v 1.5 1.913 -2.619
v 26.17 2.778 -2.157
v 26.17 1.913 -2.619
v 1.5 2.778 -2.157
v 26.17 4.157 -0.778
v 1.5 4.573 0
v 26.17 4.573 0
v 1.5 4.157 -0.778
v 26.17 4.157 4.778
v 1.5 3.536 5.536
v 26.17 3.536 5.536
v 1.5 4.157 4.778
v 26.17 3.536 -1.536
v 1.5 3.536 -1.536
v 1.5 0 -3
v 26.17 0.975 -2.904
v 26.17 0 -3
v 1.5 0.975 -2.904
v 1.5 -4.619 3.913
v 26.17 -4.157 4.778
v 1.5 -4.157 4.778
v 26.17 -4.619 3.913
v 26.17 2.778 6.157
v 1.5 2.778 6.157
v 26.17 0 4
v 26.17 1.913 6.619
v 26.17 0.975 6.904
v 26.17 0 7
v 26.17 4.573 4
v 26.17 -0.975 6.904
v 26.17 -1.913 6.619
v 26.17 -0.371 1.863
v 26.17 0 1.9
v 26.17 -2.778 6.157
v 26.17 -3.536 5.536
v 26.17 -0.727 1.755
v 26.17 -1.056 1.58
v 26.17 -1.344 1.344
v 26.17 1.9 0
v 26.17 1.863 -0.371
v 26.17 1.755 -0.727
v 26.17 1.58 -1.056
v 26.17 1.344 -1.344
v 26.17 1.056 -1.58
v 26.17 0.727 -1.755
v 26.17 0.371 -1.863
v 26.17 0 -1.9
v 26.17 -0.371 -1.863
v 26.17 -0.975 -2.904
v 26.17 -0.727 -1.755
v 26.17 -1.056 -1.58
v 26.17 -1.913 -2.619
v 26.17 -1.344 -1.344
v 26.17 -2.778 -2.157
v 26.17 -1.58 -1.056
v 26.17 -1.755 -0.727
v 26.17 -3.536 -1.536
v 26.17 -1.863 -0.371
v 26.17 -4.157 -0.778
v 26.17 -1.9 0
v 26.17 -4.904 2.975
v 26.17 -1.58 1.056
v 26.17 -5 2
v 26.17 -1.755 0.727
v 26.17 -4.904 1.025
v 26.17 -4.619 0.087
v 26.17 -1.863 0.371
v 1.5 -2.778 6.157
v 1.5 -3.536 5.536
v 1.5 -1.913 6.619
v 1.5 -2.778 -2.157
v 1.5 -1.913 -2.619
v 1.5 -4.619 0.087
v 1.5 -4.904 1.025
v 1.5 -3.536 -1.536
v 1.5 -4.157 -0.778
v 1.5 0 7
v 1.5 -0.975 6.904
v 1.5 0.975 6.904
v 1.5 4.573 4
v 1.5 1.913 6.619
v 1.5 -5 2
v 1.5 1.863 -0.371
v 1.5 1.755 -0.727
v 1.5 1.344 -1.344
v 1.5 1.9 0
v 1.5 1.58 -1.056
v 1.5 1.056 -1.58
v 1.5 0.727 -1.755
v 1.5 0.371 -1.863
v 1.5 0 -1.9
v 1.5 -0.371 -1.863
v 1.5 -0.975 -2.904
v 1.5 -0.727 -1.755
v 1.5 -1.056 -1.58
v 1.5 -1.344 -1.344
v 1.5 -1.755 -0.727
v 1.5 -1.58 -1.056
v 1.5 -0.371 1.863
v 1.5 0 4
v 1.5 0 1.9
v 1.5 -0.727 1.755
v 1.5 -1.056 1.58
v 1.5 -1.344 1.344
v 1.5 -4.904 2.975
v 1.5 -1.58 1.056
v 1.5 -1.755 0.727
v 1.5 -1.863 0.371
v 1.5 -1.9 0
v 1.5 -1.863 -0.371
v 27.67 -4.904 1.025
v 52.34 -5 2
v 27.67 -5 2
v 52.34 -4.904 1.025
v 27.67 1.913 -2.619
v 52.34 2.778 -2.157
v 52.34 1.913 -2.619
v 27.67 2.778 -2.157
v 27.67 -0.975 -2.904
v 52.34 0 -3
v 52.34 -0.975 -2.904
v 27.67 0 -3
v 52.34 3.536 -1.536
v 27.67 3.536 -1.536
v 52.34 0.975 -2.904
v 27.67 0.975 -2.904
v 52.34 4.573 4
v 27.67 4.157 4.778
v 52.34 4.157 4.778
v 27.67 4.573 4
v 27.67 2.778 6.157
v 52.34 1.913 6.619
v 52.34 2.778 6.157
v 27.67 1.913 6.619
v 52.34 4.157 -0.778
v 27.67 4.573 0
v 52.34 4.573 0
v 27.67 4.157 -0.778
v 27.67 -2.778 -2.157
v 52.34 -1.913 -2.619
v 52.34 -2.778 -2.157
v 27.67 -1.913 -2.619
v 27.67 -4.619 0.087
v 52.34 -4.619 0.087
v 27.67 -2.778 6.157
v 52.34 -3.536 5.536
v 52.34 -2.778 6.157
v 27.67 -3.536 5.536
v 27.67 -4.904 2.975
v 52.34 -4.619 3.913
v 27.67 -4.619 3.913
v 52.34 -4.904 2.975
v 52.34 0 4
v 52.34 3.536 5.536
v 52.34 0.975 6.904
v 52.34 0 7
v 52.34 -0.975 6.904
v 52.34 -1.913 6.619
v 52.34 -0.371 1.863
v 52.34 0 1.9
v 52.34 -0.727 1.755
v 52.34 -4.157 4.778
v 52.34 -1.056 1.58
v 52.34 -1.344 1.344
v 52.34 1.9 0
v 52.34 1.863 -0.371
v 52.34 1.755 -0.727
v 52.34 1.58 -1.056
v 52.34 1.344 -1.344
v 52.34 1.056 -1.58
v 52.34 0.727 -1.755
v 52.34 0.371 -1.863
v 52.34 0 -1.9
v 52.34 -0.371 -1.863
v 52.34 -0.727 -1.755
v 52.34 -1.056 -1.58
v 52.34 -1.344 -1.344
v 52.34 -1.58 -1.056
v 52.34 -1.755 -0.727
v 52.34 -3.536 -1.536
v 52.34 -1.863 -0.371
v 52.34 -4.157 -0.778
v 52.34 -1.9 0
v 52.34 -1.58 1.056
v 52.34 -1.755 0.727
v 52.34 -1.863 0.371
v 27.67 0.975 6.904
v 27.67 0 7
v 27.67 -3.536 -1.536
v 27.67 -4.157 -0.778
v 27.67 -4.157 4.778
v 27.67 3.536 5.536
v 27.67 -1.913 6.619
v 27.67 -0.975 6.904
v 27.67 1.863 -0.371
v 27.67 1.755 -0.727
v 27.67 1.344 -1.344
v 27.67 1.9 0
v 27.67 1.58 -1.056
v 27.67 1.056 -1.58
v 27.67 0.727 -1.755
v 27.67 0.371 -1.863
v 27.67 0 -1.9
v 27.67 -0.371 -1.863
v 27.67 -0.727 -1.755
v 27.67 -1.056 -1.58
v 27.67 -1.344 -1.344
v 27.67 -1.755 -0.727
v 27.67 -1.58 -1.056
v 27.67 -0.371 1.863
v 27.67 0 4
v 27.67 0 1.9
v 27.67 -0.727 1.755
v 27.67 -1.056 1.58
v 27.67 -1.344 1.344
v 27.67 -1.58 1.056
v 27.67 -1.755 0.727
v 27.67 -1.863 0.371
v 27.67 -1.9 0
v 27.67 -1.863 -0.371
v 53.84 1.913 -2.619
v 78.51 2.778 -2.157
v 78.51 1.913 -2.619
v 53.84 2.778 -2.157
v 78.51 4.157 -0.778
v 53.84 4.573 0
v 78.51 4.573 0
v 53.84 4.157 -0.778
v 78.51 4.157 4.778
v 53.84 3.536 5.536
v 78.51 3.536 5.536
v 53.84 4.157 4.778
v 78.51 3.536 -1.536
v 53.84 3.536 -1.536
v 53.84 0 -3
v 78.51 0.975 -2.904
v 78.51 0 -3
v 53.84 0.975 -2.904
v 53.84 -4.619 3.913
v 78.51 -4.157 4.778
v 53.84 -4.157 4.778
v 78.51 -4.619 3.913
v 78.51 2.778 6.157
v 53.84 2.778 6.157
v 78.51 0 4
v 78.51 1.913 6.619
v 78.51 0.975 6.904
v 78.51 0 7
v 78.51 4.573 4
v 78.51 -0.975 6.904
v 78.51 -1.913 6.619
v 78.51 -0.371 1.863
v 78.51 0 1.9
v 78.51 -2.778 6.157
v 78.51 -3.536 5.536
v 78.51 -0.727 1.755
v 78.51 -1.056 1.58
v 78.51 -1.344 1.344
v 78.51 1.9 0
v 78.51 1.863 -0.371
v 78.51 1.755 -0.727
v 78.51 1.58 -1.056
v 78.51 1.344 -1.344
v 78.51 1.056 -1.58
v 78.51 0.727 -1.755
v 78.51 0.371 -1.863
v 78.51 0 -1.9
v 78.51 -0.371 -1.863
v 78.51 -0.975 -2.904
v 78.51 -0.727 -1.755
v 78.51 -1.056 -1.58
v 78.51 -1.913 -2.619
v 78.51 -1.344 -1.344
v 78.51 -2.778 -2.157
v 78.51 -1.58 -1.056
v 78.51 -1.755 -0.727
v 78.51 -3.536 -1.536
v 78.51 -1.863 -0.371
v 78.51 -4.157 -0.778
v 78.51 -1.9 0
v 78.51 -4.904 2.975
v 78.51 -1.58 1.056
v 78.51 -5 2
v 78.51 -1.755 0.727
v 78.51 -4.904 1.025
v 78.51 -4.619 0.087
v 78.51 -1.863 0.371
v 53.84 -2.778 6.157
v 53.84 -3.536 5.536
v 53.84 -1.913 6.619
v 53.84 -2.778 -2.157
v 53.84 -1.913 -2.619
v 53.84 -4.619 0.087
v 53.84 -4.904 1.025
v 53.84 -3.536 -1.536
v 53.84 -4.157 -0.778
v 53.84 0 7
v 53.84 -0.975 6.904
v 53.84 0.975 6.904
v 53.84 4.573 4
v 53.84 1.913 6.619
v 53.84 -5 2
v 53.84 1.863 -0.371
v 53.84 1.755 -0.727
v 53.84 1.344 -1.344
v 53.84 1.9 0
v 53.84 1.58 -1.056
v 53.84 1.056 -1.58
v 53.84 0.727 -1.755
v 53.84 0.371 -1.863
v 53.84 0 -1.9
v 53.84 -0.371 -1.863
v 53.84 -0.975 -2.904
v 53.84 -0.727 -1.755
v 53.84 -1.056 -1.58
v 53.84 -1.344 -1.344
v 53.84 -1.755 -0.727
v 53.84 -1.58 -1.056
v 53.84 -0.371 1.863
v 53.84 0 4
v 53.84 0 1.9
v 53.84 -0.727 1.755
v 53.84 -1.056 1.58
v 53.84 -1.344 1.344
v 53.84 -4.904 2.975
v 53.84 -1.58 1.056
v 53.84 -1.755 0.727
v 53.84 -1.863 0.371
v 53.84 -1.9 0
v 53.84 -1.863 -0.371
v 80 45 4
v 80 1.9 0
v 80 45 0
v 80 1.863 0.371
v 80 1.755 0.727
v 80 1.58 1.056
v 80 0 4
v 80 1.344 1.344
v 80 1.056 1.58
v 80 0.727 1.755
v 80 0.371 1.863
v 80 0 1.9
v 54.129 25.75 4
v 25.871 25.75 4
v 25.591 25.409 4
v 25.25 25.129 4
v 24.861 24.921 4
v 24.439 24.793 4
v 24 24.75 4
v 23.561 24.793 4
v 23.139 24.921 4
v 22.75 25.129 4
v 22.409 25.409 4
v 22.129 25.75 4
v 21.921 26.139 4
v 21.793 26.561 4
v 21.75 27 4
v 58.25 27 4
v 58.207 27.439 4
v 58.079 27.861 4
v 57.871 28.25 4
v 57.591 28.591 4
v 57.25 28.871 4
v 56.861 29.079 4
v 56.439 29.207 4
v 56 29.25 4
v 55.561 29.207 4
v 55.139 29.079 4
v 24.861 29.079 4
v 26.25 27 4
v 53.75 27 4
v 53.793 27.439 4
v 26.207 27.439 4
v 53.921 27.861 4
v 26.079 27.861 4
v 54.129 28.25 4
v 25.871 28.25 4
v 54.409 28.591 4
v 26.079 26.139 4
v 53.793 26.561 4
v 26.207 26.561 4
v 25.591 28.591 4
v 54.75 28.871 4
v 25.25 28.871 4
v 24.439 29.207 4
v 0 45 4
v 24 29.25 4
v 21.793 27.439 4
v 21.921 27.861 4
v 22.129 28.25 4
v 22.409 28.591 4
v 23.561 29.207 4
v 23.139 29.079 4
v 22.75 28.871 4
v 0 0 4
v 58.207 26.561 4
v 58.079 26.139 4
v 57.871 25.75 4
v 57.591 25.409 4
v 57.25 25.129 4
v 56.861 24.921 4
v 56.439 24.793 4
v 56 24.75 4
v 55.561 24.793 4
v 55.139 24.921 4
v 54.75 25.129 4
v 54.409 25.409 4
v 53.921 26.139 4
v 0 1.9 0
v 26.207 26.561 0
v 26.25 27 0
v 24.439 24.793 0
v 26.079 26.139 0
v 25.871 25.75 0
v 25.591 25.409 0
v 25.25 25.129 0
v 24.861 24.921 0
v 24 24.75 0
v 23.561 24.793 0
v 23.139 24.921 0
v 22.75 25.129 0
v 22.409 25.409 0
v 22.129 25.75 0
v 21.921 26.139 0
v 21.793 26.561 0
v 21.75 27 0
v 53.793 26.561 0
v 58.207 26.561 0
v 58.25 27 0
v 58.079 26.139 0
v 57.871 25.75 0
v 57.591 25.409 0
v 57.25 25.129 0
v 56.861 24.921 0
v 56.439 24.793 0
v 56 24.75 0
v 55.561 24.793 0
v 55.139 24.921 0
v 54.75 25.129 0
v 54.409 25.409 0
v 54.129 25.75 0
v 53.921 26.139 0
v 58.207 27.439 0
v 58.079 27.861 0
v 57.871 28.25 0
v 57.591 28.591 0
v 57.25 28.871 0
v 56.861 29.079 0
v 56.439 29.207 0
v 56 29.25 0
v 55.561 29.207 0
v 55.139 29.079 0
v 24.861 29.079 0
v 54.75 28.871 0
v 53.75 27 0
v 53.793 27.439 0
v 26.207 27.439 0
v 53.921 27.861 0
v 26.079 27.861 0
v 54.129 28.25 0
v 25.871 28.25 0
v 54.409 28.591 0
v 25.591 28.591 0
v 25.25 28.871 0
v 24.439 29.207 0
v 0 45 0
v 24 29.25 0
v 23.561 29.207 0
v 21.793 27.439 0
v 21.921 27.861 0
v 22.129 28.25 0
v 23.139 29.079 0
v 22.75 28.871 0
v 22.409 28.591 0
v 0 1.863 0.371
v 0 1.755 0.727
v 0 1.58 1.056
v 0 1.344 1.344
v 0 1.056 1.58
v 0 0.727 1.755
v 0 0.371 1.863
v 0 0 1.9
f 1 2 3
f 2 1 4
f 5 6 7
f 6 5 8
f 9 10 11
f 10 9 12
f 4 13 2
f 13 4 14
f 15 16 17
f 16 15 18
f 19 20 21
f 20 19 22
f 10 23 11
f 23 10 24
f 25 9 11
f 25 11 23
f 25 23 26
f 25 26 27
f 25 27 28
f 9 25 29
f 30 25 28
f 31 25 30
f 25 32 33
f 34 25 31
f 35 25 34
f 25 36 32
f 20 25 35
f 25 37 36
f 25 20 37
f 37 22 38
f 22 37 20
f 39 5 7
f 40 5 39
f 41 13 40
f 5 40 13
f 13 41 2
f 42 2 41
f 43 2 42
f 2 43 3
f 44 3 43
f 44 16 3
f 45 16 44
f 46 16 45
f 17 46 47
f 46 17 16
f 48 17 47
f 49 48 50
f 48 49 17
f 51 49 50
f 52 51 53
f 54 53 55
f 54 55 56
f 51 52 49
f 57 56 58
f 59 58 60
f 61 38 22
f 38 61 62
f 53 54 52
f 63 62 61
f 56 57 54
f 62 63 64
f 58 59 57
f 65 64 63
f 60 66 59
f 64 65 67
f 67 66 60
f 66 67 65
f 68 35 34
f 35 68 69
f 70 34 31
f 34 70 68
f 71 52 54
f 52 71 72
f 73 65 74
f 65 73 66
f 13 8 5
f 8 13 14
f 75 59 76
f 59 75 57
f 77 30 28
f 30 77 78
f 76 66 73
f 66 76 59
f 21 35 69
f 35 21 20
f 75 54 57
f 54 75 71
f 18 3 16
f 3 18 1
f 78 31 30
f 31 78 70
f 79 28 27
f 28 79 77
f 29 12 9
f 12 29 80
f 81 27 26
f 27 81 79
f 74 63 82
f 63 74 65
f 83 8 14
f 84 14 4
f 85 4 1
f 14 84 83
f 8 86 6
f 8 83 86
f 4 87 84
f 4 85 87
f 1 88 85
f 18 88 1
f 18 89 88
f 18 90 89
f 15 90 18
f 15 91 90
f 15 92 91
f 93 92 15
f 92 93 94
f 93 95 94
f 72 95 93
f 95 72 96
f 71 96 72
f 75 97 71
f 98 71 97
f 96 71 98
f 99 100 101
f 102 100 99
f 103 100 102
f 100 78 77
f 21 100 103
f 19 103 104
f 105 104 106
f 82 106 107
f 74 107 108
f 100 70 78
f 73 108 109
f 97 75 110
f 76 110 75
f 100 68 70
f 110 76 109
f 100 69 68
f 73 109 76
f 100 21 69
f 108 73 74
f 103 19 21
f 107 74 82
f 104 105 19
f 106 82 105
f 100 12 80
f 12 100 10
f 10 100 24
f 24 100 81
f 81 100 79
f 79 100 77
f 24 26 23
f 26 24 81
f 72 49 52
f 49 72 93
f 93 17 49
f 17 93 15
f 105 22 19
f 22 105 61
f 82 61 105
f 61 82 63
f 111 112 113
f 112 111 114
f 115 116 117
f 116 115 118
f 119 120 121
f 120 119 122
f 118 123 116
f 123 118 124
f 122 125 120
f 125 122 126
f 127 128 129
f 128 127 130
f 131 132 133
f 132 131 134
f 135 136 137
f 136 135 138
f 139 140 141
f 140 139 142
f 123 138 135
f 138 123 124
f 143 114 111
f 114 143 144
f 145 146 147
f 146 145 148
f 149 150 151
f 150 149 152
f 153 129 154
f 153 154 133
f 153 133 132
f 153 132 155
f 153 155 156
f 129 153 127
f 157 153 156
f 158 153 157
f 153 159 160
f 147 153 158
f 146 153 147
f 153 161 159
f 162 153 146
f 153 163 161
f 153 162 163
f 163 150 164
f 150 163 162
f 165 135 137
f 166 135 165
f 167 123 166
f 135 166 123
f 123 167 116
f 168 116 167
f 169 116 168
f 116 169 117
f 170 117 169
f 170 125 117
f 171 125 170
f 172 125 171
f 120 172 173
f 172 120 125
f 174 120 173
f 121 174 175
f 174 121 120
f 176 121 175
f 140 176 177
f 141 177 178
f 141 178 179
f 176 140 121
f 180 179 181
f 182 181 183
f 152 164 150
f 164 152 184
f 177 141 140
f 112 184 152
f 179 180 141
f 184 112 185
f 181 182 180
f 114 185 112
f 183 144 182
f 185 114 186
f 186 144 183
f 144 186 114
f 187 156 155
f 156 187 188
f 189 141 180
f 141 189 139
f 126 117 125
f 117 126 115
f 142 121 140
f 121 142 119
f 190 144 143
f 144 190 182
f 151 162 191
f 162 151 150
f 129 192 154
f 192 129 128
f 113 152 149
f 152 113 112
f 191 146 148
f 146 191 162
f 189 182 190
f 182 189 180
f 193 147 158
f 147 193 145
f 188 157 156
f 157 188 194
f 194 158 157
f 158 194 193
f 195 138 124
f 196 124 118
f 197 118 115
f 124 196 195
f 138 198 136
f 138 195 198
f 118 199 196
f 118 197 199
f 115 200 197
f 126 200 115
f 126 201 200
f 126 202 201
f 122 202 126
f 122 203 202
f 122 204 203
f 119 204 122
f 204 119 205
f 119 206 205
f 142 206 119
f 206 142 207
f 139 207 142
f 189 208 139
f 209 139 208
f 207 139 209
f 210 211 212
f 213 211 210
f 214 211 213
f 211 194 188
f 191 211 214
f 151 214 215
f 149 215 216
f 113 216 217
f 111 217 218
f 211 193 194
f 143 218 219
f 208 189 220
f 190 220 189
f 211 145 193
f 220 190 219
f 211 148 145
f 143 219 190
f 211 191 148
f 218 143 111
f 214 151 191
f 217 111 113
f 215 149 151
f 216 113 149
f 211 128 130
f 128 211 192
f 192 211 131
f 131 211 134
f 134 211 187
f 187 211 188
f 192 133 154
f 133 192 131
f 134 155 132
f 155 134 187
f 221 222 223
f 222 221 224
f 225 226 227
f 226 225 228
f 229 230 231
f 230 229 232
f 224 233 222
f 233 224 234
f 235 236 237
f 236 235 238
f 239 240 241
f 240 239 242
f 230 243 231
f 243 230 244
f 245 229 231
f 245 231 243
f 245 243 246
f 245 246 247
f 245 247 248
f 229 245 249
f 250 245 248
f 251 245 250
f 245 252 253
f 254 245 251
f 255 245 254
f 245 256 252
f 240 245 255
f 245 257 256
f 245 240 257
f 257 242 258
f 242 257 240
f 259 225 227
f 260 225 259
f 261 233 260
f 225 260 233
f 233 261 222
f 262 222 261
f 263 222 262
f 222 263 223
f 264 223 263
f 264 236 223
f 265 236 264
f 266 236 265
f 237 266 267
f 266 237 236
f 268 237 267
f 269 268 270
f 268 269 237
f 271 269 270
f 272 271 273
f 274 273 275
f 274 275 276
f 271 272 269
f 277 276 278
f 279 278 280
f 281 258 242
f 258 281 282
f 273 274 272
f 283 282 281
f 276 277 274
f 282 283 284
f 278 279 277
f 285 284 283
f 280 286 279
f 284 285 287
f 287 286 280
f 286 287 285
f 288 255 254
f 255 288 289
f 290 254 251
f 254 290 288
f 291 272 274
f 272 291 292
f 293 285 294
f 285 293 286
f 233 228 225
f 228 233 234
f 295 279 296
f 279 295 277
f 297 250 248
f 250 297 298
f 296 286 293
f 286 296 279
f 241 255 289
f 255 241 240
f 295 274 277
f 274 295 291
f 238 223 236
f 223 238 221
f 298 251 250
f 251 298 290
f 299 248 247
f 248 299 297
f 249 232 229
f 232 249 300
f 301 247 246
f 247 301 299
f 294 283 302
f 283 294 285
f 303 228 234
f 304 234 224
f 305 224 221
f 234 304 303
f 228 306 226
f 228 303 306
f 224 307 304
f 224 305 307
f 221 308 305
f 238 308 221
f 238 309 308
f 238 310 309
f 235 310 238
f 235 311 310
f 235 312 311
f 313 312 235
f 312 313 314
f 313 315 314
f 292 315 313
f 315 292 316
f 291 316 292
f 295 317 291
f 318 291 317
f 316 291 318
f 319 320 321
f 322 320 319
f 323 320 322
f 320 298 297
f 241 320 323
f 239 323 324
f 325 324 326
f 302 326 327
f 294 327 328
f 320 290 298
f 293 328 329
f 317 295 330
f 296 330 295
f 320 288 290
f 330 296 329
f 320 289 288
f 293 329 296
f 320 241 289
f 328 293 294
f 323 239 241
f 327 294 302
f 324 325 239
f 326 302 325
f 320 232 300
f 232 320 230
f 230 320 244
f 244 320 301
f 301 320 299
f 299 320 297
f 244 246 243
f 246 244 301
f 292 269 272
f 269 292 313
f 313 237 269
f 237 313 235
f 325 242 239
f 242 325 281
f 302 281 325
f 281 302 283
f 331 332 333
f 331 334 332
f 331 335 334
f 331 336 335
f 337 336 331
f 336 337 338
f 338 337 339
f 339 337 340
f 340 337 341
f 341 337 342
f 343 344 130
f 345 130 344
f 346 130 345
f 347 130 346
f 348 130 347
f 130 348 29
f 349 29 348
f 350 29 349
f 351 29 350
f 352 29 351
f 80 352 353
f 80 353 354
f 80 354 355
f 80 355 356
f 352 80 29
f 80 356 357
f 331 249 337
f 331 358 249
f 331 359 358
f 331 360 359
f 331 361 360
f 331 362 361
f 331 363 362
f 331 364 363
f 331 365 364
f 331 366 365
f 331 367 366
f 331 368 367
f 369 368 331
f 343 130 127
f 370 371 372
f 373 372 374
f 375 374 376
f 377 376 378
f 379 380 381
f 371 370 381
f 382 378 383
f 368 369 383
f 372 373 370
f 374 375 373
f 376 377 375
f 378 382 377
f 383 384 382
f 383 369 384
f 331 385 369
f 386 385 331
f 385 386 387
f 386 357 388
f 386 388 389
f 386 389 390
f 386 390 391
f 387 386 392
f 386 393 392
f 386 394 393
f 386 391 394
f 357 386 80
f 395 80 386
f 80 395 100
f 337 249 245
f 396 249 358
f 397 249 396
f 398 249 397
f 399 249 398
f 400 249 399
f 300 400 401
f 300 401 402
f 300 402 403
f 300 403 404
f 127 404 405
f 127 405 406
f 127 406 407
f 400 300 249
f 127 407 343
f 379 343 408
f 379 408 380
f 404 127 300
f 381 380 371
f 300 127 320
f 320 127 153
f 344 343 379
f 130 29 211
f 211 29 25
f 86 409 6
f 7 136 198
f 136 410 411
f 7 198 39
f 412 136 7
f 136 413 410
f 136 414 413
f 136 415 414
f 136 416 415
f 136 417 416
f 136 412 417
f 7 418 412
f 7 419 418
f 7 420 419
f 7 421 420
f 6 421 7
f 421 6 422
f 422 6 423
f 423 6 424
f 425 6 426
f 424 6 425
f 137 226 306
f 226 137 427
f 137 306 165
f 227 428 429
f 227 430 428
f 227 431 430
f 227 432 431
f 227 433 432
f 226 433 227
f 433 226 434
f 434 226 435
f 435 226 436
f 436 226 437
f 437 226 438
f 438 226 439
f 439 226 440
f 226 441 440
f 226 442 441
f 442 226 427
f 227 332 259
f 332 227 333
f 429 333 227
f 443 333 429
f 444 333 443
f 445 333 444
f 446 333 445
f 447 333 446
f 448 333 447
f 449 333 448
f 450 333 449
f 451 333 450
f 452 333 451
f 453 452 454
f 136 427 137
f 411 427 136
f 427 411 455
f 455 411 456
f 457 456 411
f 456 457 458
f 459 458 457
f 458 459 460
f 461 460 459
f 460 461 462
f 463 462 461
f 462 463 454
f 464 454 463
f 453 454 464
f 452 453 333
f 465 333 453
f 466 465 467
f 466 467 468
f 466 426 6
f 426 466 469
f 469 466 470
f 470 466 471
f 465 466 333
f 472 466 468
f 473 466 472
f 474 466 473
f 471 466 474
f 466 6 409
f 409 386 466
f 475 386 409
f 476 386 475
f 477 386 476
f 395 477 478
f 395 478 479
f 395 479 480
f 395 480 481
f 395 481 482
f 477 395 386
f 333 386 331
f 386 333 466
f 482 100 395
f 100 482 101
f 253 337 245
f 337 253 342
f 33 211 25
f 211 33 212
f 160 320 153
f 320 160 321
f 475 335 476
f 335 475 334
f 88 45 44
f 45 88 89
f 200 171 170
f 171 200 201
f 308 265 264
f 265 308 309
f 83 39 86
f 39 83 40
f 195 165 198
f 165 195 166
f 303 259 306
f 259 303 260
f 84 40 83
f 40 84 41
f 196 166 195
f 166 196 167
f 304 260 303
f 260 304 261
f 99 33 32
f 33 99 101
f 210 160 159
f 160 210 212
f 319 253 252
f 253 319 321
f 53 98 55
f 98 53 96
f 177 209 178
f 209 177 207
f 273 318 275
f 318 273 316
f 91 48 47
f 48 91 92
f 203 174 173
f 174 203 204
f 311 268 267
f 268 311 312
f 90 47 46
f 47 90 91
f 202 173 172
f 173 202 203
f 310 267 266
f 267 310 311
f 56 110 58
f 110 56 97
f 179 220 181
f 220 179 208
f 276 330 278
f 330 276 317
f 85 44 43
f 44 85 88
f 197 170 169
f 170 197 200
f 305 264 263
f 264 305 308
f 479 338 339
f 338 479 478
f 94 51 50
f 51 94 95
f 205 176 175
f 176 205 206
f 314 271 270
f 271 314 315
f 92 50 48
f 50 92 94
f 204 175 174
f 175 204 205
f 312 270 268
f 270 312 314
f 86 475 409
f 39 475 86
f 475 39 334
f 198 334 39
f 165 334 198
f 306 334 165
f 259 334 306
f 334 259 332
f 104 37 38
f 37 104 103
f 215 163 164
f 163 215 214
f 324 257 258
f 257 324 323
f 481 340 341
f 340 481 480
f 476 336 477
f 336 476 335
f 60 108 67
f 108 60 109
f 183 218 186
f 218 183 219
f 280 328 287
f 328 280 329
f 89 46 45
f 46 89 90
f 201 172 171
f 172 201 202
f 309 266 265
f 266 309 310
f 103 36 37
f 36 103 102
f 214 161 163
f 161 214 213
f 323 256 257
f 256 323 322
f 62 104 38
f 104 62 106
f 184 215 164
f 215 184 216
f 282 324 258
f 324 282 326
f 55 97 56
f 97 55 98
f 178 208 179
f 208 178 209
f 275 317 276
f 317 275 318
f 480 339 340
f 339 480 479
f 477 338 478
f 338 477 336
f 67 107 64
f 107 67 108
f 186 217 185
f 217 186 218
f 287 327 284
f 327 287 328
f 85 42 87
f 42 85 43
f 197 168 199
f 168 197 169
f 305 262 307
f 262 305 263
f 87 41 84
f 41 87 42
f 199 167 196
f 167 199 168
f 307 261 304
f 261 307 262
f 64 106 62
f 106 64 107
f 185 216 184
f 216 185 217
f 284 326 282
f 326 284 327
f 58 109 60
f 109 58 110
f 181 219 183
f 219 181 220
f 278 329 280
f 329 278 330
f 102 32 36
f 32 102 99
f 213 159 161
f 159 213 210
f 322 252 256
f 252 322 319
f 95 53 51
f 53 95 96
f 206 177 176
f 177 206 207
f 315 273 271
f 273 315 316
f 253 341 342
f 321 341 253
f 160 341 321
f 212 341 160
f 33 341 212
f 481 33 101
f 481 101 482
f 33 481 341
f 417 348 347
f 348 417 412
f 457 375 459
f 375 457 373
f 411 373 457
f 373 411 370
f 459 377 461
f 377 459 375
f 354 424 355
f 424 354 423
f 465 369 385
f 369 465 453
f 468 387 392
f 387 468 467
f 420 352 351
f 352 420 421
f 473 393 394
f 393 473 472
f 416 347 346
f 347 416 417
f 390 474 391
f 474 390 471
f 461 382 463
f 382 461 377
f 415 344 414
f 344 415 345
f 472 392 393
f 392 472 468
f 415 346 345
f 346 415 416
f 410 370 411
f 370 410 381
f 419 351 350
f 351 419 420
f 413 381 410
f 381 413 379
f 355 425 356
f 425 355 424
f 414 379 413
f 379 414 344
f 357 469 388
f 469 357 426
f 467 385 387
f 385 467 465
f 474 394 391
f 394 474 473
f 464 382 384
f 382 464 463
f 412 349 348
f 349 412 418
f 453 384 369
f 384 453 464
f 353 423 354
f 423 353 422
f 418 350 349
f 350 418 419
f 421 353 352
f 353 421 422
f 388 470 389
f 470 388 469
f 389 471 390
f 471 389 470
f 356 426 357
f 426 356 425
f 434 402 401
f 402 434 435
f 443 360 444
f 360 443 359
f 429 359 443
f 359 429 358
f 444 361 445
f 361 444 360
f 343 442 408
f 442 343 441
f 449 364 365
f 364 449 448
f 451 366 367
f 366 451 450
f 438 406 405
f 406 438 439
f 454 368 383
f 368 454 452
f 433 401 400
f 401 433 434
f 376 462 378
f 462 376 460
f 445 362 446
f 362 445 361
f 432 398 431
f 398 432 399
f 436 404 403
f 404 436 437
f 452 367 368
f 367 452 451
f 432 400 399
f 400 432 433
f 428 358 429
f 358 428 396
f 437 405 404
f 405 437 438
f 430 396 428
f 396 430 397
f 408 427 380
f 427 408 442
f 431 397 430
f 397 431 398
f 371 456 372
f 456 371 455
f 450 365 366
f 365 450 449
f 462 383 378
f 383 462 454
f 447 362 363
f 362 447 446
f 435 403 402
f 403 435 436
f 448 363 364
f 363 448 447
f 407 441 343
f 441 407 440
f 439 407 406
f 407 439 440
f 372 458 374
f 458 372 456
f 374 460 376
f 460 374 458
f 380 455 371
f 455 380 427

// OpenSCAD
$fn = 32;

// ----------------------------------------------------------------------
// Hinge leaf: 80 x 50 x 10 mm
// ----------------------------------------------------------------------

// --- parameters (mm) ---
plate_len = 80;           // leaf length, X
plate_w = 45;             // leaf width, Y
plate_t = 4;              // leaf thickness
barrel_d = 10;            // knuckle diameter
barrel_w = 24.67;         // knuckle width
knuckle_n = 3;            // number of knuckles
pin_d = 3.8;              // pin bore
gap = 1.5;                // gap between the knuckles
screw_d = 4.5;            // screw clearance

module leaf() {
  cube([plate_len, plate_w, plate_t]);
}

module knuckles() {
  /* barrels sit on the leaf edge, the pin axis at half the leaf thickness */
  for (i = [0 : knuckle_n - 1])
    translate([gap + i * (barrel_w + gap), 0, plate_t * 0.5])
      rotate([0, 90, 0]) cylinder(h = barrel_w, d = barrel_d);
}

difference() {
  union() {
    leaf();
    knuckles();
  }
  rotate([0, 90, 0]) translate([0, 0, -1])
    cylinder(h = plate_len + 2, d = pin_d);
  translate([24, plate_w * 0.6, -1]) cylinder(h = plate_t + 2, d = screw_d);
  translate([56, plate_w * 0.6, -1]) cylinder(h = plate_t + 2, d = screw_d);
}
